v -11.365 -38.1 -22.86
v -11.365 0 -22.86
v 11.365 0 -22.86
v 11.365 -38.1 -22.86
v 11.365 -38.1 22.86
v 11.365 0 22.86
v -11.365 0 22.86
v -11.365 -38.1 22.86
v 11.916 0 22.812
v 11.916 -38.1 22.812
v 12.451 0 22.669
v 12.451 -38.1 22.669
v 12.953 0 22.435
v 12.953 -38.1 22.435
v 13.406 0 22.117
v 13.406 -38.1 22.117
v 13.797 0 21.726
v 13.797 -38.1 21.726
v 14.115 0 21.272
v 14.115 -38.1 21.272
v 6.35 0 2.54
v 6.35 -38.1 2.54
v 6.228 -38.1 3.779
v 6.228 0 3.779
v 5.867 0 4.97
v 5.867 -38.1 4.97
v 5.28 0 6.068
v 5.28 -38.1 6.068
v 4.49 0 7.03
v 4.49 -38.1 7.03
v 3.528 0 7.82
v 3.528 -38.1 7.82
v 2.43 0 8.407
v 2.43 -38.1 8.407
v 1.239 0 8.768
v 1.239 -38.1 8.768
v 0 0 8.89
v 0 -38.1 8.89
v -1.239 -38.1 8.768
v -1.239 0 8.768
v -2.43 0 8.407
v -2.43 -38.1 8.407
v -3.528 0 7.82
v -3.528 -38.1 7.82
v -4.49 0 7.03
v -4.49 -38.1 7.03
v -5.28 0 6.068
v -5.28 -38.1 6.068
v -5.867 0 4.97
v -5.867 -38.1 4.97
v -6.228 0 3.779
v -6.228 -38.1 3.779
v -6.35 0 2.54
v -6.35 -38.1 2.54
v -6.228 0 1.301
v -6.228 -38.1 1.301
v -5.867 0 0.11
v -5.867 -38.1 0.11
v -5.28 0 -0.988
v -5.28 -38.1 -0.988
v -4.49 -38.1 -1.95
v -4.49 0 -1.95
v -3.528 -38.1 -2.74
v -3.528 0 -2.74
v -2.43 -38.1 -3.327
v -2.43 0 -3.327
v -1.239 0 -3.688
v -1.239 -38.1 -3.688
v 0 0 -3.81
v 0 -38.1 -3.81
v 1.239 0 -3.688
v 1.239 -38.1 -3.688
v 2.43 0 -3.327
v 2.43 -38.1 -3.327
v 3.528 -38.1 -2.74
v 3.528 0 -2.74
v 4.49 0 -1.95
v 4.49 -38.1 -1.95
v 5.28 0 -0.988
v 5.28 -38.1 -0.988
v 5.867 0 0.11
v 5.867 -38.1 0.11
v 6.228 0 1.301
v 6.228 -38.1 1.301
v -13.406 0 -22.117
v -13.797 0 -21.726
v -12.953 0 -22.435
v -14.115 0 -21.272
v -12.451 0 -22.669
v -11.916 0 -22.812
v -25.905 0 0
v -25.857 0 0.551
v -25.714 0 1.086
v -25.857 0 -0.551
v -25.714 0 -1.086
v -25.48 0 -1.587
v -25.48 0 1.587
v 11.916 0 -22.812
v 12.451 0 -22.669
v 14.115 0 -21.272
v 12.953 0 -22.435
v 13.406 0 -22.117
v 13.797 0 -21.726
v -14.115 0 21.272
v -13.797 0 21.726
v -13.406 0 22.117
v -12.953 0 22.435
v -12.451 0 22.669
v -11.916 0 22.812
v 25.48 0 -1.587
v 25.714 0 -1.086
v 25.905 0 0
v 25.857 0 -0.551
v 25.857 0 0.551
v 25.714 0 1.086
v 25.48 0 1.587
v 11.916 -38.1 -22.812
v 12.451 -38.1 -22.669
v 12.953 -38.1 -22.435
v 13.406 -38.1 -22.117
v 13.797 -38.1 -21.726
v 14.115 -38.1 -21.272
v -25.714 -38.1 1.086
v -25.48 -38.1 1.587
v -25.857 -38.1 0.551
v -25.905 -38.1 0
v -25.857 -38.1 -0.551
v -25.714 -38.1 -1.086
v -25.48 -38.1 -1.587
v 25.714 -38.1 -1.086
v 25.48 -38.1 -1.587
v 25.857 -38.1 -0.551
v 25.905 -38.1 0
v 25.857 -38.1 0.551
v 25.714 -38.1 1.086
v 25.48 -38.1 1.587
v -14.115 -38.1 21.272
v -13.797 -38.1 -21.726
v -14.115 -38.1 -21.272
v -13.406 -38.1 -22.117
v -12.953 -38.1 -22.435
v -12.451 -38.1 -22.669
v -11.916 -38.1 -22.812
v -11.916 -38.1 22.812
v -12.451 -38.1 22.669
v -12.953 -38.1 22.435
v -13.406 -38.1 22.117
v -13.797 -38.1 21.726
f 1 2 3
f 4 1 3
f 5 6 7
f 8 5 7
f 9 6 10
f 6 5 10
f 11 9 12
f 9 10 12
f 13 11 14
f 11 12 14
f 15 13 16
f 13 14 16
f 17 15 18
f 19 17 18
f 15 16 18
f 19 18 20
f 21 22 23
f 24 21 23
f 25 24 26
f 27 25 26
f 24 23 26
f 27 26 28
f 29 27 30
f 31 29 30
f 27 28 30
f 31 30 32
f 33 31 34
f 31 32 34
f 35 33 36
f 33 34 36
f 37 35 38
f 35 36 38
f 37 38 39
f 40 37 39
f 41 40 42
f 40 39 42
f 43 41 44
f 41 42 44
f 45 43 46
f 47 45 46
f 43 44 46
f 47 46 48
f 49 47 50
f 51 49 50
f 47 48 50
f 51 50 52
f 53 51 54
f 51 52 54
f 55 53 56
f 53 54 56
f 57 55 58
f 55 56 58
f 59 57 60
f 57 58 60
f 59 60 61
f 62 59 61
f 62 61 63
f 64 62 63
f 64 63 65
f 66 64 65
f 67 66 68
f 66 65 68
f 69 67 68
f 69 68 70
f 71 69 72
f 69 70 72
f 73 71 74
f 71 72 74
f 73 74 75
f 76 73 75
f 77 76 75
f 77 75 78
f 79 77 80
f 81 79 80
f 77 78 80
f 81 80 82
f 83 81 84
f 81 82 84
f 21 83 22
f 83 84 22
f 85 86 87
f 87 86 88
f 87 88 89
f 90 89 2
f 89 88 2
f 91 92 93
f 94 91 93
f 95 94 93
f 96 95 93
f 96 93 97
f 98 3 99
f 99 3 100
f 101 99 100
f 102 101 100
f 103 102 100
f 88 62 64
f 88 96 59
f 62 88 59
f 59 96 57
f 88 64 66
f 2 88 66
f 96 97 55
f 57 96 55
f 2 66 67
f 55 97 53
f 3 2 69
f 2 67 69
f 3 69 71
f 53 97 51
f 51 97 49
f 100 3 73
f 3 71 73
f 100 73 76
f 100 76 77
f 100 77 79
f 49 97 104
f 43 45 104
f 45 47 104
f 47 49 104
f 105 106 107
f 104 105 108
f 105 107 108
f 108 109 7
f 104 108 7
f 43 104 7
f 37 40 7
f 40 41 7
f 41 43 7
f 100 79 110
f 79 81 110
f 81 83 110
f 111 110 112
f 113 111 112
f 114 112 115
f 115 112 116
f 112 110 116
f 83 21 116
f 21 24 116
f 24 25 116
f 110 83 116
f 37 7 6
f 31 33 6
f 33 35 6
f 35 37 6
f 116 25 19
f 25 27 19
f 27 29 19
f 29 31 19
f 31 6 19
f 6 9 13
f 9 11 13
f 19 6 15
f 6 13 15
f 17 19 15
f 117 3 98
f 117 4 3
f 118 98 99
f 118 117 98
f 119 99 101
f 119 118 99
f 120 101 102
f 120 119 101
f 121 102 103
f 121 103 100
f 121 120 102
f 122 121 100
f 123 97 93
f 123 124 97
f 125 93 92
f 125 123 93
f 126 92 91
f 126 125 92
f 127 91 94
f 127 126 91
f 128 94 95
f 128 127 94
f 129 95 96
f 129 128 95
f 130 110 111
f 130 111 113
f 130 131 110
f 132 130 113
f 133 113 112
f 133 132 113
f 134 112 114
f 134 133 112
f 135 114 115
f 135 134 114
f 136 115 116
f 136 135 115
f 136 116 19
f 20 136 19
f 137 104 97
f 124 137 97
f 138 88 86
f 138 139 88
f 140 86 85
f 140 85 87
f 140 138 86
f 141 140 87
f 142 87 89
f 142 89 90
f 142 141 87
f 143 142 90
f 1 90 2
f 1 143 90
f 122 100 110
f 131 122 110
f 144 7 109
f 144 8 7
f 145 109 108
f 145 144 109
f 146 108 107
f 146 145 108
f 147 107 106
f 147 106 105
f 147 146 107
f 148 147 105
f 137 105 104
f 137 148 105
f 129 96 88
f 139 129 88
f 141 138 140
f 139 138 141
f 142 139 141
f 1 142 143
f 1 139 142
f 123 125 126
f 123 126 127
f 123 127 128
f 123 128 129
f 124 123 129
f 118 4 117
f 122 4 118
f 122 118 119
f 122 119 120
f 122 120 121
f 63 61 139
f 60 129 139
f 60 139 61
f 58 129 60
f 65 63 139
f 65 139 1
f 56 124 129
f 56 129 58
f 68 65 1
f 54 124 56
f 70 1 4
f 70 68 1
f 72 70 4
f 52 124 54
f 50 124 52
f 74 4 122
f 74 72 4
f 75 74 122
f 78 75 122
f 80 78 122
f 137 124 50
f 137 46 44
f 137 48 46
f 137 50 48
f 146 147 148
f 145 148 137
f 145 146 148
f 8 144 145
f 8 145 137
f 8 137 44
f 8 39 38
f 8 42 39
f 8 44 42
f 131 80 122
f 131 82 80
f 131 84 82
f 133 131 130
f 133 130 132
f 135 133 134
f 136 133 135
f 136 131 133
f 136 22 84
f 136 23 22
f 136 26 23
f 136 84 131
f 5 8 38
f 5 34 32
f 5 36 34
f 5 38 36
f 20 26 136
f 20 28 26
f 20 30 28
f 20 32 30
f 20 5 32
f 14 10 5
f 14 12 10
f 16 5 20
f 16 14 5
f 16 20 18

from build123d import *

# Parameters (mm, degrees)
F1_DEPTH = 38.1
F2_R     = 3.175
F4_DEPTH = 38.1


with BuildPart() as f1:
    # F0 (on Front) → F1 (new body)
    with BuildSketch(Plane.XZ):
        Polygon((13.198227, 22.86), (-13.198227, 22.86), (-26.396454, 0), (-13.198227, -22.86), (13.198227, -22.86), (26.396454, 0), align=None)
    extrude(amount=F1_DEPTH)

    # F2
    f2_edges = [f1.edges().sort_by_distance(p)[0] for p in [
        (13.198227, -19.05, 22.86),
        (26.396454, -19.05, 0),
        (13.198227, -19.05, -22.86),
        (-13.198227, -19.05, -22.86),
        (-26.396454, -19.05, 0),
        (-13.198227, -19.05, 22.86),
    ]]
    fillet(f2_edges, radius=F2_R)

    # F3 (on face) → F4 (cut, through all)
    with BuildSketch(Plane.XZ.offset(38.1)):
        with BuildLine():
            ThreePointArc((0, 8.89), (-4.490128, -1.950128), (6.35, 2.54))
            ThreePointArc((6.35, 2.54), (4.490128, 7.030128), (0, 8.89))
        make_face()
    extrude(amount=-F4_DEPTH, mode=Mode.SUBTRACT)


solid = f1.part
